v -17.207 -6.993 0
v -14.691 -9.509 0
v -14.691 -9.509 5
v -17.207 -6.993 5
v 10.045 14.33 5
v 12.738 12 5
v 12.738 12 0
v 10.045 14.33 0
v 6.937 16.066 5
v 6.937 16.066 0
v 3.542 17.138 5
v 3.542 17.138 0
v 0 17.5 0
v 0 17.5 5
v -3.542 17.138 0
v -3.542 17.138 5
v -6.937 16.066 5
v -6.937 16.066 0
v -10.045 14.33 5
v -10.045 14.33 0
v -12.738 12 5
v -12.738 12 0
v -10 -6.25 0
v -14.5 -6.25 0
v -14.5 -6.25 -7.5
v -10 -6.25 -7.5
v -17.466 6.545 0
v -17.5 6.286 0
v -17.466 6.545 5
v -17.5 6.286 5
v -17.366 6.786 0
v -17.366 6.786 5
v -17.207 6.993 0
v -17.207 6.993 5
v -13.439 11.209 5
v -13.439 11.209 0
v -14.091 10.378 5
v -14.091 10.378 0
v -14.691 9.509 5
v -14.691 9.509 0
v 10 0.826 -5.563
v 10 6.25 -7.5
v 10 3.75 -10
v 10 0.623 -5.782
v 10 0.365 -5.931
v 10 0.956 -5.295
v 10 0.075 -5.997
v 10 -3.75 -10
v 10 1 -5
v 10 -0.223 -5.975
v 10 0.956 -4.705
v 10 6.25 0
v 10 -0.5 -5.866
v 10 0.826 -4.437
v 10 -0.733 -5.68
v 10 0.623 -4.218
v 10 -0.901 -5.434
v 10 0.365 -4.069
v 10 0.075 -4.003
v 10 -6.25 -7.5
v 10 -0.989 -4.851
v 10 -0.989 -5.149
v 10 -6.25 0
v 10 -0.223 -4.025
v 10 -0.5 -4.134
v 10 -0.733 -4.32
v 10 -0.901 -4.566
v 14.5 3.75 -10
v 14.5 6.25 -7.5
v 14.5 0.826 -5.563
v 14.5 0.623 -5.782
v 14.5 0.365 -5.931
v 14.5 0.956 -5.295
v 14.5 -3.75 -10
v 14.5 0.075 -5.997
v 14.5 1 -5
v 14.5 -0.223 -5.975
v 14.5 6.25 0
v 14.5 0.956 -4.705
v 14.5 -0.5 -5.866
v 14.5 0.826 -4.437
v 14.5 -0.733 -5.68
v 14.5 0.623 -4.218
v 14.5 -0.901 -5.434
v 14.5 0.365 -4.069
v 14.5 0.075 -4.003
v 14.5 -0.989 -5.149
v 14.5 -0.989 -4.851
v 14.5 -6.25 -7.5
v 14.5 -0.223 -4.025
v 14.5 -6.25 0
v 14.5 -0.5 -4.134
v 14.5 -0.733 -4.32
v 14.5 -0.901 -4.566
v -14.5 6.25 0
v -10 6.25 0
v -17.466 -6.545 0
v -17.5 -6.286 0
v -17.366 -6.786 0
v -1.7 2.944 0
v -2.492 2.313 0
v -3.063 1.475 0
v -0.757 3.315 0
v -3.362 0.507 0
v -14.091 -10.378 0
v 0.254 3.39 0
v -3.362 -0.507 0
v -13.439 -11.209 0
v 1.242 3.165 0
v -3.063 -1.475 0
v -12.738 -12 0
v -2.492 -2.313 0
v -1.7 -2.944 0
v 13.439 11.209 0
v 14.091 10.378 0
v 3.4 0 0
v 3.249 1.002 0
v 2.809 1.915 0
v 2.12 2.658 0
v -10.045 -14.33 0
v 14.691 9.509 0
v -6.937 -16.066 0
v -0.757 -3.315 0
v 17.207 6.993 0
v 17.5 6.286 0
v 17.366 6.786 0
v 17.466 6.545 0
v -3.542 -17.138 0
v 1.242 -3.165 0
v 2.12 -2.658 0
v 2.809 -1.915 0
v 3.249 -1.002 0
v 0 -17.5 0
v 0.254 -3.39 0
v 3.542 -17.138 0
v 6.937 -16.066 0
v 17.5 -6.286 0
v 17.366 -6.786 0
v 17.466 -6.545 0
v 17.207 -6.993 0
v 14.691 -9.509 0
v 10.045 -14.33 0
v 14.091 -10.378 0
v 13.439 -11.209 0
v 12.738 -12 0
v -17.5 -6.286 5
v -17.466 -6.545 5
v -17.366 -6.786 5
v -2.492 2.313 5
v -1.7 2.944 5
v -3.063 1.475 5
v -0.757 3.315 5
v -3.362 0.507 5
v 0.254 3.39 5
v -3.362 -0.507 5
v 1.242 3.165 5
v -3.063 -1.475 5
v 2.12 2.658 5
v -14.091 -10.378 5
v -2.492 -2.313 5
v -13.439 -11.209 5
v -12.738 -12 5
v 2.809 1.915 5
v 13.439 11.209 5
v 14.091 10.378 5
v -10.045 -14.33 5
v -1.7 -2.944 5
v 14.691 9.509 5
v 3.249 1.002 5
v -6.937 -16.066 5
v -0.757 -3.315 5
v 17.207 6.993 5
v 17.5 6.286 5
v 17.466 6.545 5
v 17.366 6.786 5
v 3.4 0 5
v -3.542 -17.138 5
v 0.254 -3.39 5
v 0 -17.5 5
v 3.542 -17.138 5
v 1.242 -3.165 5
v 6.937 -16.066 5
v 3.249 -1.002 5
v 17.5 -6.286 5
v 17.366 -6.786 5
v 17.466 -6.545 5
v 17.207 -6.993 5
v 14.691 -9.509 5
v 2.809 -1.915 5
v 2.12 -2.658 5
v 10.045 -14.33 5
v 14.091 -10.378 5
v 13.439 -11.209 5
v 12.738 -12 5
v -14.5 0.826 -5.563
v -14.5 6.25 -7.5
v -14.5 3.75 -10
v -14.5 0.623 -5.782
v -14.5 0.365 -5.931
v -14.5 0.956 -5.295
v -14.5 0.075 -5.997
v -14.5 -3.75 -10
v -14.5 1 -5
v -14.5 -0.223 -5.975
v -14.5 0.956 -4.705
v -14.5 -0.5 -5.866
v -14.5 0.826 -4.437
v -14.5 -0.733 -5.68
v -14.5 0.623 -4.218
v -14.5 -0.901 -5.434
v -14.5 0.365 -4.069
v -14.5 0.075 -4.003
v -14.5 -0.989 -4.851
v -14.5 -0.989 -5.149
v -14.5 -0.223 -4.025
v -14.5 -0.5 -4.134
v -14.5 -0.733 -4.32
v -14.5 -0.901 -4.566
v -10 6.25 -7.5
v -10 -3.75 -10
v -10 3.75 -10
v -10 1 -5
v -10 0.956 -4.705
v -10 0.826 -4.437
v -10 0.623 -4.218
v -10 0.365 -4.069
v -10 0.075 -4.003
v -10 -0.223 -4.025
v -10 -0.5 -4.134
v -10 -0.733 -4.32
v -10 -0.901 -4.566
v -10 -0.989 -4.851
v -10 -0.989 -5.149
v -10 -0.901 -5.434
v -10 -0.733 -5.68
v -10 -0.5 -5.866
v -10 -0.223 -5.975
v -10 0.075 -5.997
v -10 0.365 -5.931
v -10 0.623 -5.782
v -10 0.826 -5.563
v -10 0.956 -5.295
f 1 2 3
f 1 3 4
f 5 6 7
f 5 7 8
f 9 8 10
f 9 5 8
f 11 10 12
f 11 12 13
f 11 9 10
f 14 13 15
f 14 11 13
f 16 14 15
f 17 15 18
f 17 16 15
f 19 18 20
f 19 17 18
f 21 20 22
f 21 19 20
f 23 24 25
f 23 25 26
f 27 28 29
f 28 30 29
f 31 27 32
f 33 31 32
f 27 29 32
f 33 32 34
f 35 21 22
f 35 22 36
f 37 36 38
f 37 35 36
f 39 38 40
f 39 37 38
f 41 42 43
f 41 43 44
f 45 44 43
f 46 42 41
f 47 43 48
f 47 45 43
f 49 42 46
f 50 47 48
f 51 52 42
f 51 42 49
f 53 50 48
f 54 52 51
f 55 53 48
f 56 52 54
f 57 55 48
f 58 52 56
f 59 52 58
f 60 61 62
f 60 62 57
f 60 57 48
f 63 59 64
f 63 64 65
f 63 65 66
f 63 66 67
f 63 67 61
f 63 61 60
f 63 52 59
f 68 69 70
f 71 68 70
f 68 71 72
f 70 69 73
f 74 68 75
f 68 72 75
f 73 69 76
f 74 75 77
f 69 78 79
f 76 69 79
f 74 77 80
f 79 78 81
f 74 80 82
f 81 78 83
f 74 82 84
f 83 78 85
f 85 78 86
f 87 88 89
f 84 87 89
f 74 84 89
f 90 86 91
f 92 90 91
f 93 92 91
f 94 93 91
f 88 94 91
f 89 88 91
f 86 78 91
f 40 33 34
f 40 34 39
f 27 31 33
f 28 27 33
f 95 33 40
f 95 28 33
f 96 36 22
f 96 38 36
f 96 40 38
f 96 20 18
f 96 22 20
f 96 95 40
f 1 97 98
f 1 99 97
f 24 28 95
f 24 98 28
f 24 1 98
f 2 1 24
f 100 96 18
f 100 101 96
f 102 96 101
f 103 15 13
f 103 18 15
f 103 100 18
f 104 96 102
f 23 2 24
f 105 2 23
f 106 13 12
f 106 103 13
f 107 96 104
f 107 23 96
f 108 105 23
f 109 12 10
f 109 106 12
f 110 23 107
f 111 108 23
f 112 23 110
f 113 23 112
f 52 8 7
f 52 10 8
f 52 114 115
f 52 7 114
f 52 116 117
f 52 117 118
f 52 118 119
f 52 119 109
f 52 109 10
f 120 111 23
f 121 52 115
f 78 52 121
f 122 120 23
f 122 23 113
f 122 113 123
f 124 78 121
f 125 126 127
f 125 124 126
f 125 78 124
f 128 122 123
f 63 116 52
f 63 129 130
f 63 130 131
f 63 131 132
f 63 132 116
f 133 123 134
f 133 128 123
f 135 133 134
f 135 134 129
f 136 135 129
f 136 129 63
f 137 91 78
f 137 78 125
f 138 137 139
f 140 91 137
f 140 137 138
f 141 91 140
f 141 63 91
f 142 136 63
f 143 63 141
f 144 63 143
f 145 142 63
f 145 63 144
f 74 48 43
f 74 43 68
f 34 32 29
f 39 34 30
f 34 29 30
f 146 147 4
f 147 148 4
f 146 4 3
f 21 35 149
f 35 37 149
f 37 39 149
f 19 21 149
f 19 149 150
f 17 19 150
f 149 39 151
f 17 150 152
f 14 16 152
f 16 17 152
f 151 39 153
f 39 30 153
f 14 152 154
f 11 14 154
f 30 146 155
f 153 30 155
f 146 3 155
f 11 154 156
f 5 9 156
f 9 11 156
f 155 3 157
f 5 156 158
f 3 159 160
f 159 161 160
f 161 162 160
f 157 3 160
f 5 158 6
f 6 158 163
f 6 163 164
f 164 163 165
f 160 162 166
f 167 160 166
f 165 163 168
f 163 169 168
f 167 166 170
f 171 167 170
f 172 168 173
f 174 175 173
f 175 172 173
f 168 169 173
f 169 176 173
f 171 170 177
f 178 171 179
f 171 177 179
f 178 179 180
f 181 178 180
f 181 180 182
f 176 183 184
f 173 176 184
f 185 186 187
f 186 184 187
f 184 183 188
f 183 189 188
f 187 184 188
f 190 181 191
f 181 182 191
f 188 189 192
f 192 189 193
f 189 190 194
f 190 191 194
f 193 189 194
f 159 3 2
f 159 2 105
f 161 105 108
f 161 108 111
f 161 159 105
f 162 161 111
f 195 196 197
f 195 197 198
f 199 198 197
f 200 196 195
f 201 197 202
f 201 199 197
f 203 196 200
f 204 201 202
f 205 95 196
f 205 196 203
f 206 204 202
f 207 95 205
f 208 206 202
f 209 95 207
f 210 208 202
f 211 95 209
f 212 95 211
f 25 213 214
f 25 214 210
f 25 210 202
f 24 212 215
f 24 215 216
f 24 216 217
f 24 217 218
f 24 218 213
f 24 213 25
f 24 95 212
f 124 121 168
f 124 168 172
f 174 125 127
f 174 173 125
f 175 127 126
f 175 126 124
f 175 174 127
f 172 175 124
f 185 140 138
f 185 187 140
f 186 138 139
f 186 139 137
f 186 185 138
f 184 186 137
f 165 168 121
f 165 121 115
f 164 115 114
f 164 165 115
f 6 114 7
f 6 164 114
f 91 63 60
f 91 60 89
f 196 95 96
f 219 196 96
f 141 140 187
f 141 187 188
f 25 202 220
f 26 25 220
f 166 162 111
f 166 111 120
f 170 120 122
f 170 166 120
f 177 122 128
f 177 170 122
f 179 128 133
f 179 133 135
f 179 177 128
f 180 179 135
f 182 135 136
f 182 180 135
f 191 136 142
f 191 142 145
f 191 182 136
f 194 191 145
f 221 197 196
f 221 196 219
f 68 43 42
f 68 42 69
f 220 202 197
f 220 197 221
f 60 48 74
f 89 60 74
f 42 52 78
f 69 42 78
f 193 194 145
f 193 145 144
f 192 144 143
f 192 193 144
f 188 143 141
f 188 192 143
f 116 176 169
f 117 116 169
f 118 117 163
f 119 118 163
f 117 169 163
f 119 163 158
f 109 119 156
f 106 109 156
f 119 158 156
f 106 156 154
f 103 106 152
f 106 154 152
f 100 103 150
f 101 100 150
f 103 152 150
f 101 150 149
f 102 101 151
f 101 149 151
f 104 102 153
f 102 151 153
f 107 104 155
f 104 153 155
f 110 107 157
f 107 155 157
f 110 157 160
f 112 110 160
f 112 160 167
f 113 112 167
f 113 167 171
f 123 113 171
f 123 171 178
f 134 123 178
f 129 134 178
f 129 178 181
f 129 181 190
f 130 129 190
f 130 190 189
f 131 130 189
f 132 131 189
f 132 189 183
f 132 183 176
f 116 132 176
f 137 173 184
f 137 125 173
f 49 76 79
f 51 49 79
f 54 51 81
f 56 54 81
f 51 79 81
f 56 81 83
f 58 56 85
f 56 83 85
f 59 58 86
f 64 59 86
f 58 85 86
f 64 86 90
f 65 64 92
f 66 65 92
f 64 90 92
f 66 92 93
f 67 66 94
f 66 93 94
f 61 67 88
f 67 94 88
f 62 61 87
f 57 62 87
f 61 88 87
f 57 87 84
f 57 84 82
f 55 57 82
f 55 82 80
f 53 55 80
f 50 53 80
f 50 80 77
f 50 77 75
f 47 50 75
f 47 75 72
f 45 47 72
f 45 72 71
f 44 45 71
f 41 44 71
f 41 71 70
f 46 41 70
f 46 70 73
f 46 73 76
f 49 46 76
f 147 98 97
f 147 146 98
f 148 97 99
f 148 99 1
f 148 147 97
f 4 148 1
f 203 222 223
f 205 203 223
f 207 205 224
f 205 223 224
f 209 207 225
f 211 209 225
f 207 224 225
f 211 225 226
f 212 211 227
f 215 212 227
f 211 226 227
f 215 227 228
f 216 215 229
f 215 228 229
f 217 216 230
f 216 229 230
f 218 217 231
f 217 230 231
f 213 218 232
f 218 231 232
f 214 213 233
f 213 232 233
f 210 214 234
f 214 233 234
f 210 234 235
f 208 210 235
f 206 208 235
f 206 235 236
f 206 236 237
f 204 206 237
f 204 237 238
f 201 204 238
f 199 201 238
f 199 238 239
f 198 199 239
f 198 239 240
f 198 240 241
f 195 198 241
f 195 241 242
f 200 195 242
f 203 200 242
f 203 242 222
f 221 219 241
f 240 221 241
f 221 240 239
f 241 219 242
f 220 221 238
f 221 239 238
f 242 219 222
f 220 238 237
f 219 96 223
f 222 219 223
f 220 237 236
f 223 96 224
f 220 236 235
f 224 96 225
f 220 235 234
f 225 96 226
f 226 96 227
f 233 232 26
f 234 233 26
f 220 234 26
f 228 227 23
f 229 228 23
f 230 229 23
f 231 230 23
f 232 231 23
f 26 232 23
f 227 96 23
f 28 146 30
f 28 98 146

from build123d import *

# Parameters (mm, degrees)
F1_DEPTH      = 5
F3_SIZE       = 1
F2_W          = 4.5
F2_H          = 12.5
F4_DEPTH      = 10
F5_SIZE       = 2.5
F6_R          = 1
F7_DEPTH      = 39.5010001
F8_R          = 39.5864097355
F8_R_2        = 17.5
F9_DEPTH      = 25
F10_R         = 3.4
F11_DEPTH     = 25
F13_DEPTH     = 5
F14_T4_DEPTH  = 32.2598396724
F14_S5_R      = 17.5
F14_T6_DEPTH  = 18
F14_T10_DEPTH = 32.2598396724
F14_S11_R     = 17.5
F14_T12_DEPTH = 18
F14_T16_DEPTH = 32.2598396724
F14_S17_R     = 17.5
F14_T18_DEPTH = 18
F14_T22_DEPTH = 32.2598396724
F14_S23_R     = 17.5
F14_T24_DEPTH = 18
F15_R         = 1


# Not quite as in the source:
# - a fillet or chamfer that OpenCascade refuses, or shapes differently, is made with other operations: its cross-section is extruded or revolved along the edge and cut away or added


with BuildPart() as f1:
    # F0 (on Top) → F1 (new body)
    with BuildSketch(Plane.XY):
        with BuildLine():
            ThreePointArc((19.8625961196, -15.8301909188), (23.6080012184, -12.5093598908), (25, -7.7012087429))
            Line((25, -7.7012087429), (25, 7.7012087429))
            ThreePointArc((25, 7.7012087429), (23.6080012184, 12.5093598908), (19.8625961196, 15.8301909188))
            add(Edge.make_bspline(
                [(19.8625961196, 15.8301909188), (0, 25.2681728257), (-19.8625961196, 15.8301909188)],
                knots=[0.9132750433, 0.9132750433, 0.9132750433, 2.2283176103, 2.2283176103, 2.2283176103], degree=2, weights=[1, 0.7915095459, 1]))
            ThreePointArc((-19.8625961196, 15.8301909188), (-23.6080012184, 12.5093598908), (-25, 7.7012087429))
            Line((-25, 7.7012087429), (-25, -7.7012087429))
            ThreePointArc((-25, -7.7012087429), (-23.6080012184, -12.5093598908), (-19.8625961196, -15.8301909188))
            add(Edge.make_bspline(
                [(-19.8625961196, -15.8301909188), (0, -25.2681728257), (19.8625961196, -15.8301909188)],
                knots=[4.0548676969, 4.0548676969, 4.0548676969, 5.3699102639, 5.3699102639, 5.3699102639], degree=2, weights=[1, 0.7915095459, 1]))
        make_face()
    extrude(amount=F1_DEPTH)

    # F3
    f3_edges = [f1.edges().sort_by_distance(p)[0] for p in [
        (4e-06, -20, 0),
    ]]
    chamfer(f3_edges, length=F3_SIZE)

    # F2 (on face) → F4 (join)
    with BuildSketch(Plane(origin=(0, 0, 0), x_dir=(1, 0, 0), z_dir=(0, 0, -1))):
        with Locations((12.25, 0)):
            Rectangle(F2_W, F2_H)
        with Locations((-12.25, 0)):
            Rectangle(F2_W, F2_H)
    extrude(amount=F4_DEPTH)

    # F5
    f5_edges = [f1.edges().sort_by_distance(p)[0] for p in [
        (-12.25, -6.25, -10),
        (12.25, -6.25, -10),
        (-12.25, 6.25, -10),
        (12.25, 6.25, -10),
    ]]
    chamfer(f5_edges, length=F5_SIZE)

    # F6 (on face) → F7 (cut, through all)
    with BuildSketch(Plane.YZ.offset(14.5)):
        with Locations((0, -5)):
            Circle(F6_R)
    extrude(amount=-F7_DEPTH, mode=Mode.SUBTRACT)

    # F8 (on face) → F9 (cut)
    with BuildSketch(Plane.XY.offset(5)):
        Circle(F8_R)
        with BuildLine():
            add(Edge.make_bspline(
                [(-19.8625961196, -15.8301909188), (0, -25.2681728257), (19.8625961196, -15.8301909188)],
                knots=[4.0548676969, 4.0548676969, 4.0548676969, 5.3699102639, 5.3699102639, 5.3699102639], degree=2, weights=[1, 0.7915095459, 1]))
            ThreePointArc((-19.8625961196, -15.8301909188), (-23.6080012184, -12.5093598908), (-25, -7.7012087429))
            Line((-25, -7.7012087429), (-25, 7.7012087429))
            ThreePointArc((-25, 7.7012087429), (-23.6080012184, 12.5093598908), (-19.8625961196, 15.8301909188))
            add(Edge.make_bspline(
                [(19.8625961196, 15.8301909188), (0, 25.2681728257), (-19.8625961196, 15.8301909188)],
                knots=[0.9132750433, 0.9132750433, 0.9132750433, 2.2283176103, 2.2283176103, 2.2283176103], degree=2, weights=[1, 0.7915095459, 1]))
            ThreePointArc((19.8625961196, 15.8301909188), (23.6080012184, 12.5093598908), (25, 7.7012087429))
            Line((25, 7.7012087429), (25, -7.7012087429))
            ThreePointArc((25, -7.7012087429), (23.6080012184, -12.5093598908), (19.8625961196, -15.8301909188))
        make_face(mode=Mode.SUBTRACT)
        with BuildLine():
            ThreePointArc((-25, -7.7012087429), (-23.6080012184, -12.5093598908), (-19.8625961196, -15.8301909188))
            add(Edge.make_bspline(
                [(-19.8625961196, -15.8301909188), (0, -25.2681728257), (19.8625961196, -15.8301909188)],
                knots=[4.0548676969, 4.0548676969, 4.0548676969, 5.3699102639, 5.3699102639, 5.3699102639], degree=2, weights=[1, 0.7915095459, 1]))
            ThreePointArc((19.8625961196, -15.8301909188), (23.6080012184, -12.5093598908), (25, -7.7012087429))
            Line((25, -7.7012087429), (25, 7.7012087429))
            ThreePointArc((25, 7.7012087429), (23.6080012184, 12.5093598908), (19.8625961196, 15.8301909188))
            add(Edge.make_bspline(
                [(19.8625961196, 15.8301909188), (0, 25.2681728257), (-19.8625961196, 15.8301909188)],
                knots=[0.9132750433, 0.9132750433, 0.9132750433, 2.2283176103, 2.2283176103, 2.2283176103], degree=2, weights=[1, 0.7915095459, 1]))
            ThreePointArc((-19.8625961196, 15.8301909188), (-23.6080012184, 12.5093598908), (-25, 7.7012087429))
            Line((-25, 7.7012087429), (-25, -7.7012087429))
        make_face()
        Circle(F8_R_2, mode=Mode.SUBTRACT)
    extrude(amount=-F9_DEPTH, mode=Mode.SUBTRACT)

    # F10 (on face) → F11 (cut)
    with BuildSketch(Plane.XY.offset(5)):
        Circle(F10_R)
    extrude(amount=-F11_DEPTH, mode=Mode.SUBTRACT)

    # F12 (on face) → F13 (join)
    with BuildSketch(Plane(origin=(0, 0, 0), x_dir=(1, 0, 0), z_dir=(0, 0, -1))):
        with BuildLine():
            Line((-17.5, 12), (-17.5, -1.86e-08))
            ThreePointArc((-17.5, -1.86e-08), (-16.2659219885, 6.4552135413), (-12.7377392029, 12))
            Line((-12.7377392029, 12), (-17.5, 12))
        make_face()
        with BuildLine():
            ThreePointArc((12.7377392029, 12), (16.2659219851, 6.4552135499), (17.5, 0))
            Line((17.5, 0), (17.5, 12))
            Line((17.5, 12), (12.7377392029, 12))
        make_face()
        with BuildLine():
            Line((12.7377392029, -12), (17.5, -12))
            Line((17.5, -12), (17.5, 0))
            ThreePointArc((17.5, 0), (16.2659219851, -6.4552135499), (12.7377392029, -12))
        make_face()
        with BuildLine():
            Line((-17.5, -12), (-12.7377392029, -12))
            ThreePointArc((-12.7377392029, -12), (-16.2659219817, -6.4552135586), (-17.5, -1.86e-08))
            Line((-17.5, -1.86e-08), (-17.5, -12))
        make_face()
    extrude(amount=-F13_DEPTH)

    # F14: chamfer of 5.3 on 4 edges, made by hand


with BuildPart() as f14_tool2:
    # F14_s3 → F14_t4 (new body)
    with BuildSketch(Plane.XY.offset(-13.6299198362)):
        Polygon((17.5, -6.7), (12.2, -12), (17.5, -12), align=None)
    extrude(amount=F14_T4_DEPTH)

    # F14_s5 → F14_t6 (cut, symmetric)
    with BuildSketch(Plane.XY.offset(2.5)):
        Circle(F14_S5_R)
    extrude(amount=F14_T6_DEPTH, both=True, mode=Mode.SUBTRACT)


with BuildPart() as f1_1:
    add(f1.part)

    # F14_t1: cut F14_tool2
    add(f14_tool2.part, mode=Mode.SUBTRACT)


with BuildPart() as f14_tool8:
    # F14_s9 → F14_t10 (new body)
    with BuildSketch(Plane.XY.offset(-13.6299198362)):
        Polygon((12.2, 12), (17.5, 6.7), (17.5, 12), align=None)
    extrude(amount=F14_T10_DEPTH)

    # F14_s11 → F14_t12 (cut, symmetric)
    with BuildSketch(Plane.XY.offset(2.5)):
        Circle(F14_S11_R)
    extrude(amount=F14_T12_DEPTH, both=True, mode=Mode.SUBTRACT)


with BuildPart() as f1_2:
    add(f1_1.part)

    # F14_t7: cut F14_tool8
    add(f14_tool8.part, mode=Mode.SUBTRACT)


with BuildPart() as f14_tool14:
    # F14_s15 → F14_t16 (new body)
    with BuildSketch(Plane.XY.offset(-13.6299198362)):
        Polygon((-12.2, -12), (-17.5, -6.7), (-17.5, -12), align=None)
    extrude(amount=F14_T16_DEPTH)

    # F14_s17 → F14_t18 (cut, symmetric)
    with BuildSketch(Plane.XY.offset(2.5)):
        Circle(F14_S17_R)
    extrude(amount=F14_T18_DEPTH, both=True, mode=Mode.SUBTRACT)


with BuildPart() as f1_3:
    add(f1_2.part)

    # F14_t13: cut F14_tool14
    add(f14_tool14.part, mode=Mode.SUBTRACT)


with BuildPart() as f14_tool20:
    # F14_s21 → F14_t22 (new body)
    with BuildSketch(Plane.XY.offset(-13.6299198362)):
        Polygon((-17.5, 6.7), (-12.2, 12), (-17.5, 12), align=None)
    extrude(amount=F14_T22_DEPTH)

    # F14_s23 → F14_t24 (cut, symmetric)
    with BuildSketch(Plane.XY.offset(2.5)):
        Circle(F14_S23_R)
    extrude(amount=F14_T24_DEPTH, both=True, mode=Mode.SUBTRACT)


with BuildPart() as f1_4:
    add(f1_3.part)

    # F14_t19: cut F14_tool20
    add(f14_tool20.part, mode=Mode.SUBTRACT)

    # F15
    f15_edges = [f1_4.edges().sort_by_distance(p)[0] for p in [
        (-17.5, -6.7, 2.5),
        (-17.5, 6.7, 2.5),
        (17.5, 6.7, 2.5),
        (17.5, -6.7, 2.5),
    ]]
    fillet(f15_edges, radius=F15_R)


solid = f1_4.part
